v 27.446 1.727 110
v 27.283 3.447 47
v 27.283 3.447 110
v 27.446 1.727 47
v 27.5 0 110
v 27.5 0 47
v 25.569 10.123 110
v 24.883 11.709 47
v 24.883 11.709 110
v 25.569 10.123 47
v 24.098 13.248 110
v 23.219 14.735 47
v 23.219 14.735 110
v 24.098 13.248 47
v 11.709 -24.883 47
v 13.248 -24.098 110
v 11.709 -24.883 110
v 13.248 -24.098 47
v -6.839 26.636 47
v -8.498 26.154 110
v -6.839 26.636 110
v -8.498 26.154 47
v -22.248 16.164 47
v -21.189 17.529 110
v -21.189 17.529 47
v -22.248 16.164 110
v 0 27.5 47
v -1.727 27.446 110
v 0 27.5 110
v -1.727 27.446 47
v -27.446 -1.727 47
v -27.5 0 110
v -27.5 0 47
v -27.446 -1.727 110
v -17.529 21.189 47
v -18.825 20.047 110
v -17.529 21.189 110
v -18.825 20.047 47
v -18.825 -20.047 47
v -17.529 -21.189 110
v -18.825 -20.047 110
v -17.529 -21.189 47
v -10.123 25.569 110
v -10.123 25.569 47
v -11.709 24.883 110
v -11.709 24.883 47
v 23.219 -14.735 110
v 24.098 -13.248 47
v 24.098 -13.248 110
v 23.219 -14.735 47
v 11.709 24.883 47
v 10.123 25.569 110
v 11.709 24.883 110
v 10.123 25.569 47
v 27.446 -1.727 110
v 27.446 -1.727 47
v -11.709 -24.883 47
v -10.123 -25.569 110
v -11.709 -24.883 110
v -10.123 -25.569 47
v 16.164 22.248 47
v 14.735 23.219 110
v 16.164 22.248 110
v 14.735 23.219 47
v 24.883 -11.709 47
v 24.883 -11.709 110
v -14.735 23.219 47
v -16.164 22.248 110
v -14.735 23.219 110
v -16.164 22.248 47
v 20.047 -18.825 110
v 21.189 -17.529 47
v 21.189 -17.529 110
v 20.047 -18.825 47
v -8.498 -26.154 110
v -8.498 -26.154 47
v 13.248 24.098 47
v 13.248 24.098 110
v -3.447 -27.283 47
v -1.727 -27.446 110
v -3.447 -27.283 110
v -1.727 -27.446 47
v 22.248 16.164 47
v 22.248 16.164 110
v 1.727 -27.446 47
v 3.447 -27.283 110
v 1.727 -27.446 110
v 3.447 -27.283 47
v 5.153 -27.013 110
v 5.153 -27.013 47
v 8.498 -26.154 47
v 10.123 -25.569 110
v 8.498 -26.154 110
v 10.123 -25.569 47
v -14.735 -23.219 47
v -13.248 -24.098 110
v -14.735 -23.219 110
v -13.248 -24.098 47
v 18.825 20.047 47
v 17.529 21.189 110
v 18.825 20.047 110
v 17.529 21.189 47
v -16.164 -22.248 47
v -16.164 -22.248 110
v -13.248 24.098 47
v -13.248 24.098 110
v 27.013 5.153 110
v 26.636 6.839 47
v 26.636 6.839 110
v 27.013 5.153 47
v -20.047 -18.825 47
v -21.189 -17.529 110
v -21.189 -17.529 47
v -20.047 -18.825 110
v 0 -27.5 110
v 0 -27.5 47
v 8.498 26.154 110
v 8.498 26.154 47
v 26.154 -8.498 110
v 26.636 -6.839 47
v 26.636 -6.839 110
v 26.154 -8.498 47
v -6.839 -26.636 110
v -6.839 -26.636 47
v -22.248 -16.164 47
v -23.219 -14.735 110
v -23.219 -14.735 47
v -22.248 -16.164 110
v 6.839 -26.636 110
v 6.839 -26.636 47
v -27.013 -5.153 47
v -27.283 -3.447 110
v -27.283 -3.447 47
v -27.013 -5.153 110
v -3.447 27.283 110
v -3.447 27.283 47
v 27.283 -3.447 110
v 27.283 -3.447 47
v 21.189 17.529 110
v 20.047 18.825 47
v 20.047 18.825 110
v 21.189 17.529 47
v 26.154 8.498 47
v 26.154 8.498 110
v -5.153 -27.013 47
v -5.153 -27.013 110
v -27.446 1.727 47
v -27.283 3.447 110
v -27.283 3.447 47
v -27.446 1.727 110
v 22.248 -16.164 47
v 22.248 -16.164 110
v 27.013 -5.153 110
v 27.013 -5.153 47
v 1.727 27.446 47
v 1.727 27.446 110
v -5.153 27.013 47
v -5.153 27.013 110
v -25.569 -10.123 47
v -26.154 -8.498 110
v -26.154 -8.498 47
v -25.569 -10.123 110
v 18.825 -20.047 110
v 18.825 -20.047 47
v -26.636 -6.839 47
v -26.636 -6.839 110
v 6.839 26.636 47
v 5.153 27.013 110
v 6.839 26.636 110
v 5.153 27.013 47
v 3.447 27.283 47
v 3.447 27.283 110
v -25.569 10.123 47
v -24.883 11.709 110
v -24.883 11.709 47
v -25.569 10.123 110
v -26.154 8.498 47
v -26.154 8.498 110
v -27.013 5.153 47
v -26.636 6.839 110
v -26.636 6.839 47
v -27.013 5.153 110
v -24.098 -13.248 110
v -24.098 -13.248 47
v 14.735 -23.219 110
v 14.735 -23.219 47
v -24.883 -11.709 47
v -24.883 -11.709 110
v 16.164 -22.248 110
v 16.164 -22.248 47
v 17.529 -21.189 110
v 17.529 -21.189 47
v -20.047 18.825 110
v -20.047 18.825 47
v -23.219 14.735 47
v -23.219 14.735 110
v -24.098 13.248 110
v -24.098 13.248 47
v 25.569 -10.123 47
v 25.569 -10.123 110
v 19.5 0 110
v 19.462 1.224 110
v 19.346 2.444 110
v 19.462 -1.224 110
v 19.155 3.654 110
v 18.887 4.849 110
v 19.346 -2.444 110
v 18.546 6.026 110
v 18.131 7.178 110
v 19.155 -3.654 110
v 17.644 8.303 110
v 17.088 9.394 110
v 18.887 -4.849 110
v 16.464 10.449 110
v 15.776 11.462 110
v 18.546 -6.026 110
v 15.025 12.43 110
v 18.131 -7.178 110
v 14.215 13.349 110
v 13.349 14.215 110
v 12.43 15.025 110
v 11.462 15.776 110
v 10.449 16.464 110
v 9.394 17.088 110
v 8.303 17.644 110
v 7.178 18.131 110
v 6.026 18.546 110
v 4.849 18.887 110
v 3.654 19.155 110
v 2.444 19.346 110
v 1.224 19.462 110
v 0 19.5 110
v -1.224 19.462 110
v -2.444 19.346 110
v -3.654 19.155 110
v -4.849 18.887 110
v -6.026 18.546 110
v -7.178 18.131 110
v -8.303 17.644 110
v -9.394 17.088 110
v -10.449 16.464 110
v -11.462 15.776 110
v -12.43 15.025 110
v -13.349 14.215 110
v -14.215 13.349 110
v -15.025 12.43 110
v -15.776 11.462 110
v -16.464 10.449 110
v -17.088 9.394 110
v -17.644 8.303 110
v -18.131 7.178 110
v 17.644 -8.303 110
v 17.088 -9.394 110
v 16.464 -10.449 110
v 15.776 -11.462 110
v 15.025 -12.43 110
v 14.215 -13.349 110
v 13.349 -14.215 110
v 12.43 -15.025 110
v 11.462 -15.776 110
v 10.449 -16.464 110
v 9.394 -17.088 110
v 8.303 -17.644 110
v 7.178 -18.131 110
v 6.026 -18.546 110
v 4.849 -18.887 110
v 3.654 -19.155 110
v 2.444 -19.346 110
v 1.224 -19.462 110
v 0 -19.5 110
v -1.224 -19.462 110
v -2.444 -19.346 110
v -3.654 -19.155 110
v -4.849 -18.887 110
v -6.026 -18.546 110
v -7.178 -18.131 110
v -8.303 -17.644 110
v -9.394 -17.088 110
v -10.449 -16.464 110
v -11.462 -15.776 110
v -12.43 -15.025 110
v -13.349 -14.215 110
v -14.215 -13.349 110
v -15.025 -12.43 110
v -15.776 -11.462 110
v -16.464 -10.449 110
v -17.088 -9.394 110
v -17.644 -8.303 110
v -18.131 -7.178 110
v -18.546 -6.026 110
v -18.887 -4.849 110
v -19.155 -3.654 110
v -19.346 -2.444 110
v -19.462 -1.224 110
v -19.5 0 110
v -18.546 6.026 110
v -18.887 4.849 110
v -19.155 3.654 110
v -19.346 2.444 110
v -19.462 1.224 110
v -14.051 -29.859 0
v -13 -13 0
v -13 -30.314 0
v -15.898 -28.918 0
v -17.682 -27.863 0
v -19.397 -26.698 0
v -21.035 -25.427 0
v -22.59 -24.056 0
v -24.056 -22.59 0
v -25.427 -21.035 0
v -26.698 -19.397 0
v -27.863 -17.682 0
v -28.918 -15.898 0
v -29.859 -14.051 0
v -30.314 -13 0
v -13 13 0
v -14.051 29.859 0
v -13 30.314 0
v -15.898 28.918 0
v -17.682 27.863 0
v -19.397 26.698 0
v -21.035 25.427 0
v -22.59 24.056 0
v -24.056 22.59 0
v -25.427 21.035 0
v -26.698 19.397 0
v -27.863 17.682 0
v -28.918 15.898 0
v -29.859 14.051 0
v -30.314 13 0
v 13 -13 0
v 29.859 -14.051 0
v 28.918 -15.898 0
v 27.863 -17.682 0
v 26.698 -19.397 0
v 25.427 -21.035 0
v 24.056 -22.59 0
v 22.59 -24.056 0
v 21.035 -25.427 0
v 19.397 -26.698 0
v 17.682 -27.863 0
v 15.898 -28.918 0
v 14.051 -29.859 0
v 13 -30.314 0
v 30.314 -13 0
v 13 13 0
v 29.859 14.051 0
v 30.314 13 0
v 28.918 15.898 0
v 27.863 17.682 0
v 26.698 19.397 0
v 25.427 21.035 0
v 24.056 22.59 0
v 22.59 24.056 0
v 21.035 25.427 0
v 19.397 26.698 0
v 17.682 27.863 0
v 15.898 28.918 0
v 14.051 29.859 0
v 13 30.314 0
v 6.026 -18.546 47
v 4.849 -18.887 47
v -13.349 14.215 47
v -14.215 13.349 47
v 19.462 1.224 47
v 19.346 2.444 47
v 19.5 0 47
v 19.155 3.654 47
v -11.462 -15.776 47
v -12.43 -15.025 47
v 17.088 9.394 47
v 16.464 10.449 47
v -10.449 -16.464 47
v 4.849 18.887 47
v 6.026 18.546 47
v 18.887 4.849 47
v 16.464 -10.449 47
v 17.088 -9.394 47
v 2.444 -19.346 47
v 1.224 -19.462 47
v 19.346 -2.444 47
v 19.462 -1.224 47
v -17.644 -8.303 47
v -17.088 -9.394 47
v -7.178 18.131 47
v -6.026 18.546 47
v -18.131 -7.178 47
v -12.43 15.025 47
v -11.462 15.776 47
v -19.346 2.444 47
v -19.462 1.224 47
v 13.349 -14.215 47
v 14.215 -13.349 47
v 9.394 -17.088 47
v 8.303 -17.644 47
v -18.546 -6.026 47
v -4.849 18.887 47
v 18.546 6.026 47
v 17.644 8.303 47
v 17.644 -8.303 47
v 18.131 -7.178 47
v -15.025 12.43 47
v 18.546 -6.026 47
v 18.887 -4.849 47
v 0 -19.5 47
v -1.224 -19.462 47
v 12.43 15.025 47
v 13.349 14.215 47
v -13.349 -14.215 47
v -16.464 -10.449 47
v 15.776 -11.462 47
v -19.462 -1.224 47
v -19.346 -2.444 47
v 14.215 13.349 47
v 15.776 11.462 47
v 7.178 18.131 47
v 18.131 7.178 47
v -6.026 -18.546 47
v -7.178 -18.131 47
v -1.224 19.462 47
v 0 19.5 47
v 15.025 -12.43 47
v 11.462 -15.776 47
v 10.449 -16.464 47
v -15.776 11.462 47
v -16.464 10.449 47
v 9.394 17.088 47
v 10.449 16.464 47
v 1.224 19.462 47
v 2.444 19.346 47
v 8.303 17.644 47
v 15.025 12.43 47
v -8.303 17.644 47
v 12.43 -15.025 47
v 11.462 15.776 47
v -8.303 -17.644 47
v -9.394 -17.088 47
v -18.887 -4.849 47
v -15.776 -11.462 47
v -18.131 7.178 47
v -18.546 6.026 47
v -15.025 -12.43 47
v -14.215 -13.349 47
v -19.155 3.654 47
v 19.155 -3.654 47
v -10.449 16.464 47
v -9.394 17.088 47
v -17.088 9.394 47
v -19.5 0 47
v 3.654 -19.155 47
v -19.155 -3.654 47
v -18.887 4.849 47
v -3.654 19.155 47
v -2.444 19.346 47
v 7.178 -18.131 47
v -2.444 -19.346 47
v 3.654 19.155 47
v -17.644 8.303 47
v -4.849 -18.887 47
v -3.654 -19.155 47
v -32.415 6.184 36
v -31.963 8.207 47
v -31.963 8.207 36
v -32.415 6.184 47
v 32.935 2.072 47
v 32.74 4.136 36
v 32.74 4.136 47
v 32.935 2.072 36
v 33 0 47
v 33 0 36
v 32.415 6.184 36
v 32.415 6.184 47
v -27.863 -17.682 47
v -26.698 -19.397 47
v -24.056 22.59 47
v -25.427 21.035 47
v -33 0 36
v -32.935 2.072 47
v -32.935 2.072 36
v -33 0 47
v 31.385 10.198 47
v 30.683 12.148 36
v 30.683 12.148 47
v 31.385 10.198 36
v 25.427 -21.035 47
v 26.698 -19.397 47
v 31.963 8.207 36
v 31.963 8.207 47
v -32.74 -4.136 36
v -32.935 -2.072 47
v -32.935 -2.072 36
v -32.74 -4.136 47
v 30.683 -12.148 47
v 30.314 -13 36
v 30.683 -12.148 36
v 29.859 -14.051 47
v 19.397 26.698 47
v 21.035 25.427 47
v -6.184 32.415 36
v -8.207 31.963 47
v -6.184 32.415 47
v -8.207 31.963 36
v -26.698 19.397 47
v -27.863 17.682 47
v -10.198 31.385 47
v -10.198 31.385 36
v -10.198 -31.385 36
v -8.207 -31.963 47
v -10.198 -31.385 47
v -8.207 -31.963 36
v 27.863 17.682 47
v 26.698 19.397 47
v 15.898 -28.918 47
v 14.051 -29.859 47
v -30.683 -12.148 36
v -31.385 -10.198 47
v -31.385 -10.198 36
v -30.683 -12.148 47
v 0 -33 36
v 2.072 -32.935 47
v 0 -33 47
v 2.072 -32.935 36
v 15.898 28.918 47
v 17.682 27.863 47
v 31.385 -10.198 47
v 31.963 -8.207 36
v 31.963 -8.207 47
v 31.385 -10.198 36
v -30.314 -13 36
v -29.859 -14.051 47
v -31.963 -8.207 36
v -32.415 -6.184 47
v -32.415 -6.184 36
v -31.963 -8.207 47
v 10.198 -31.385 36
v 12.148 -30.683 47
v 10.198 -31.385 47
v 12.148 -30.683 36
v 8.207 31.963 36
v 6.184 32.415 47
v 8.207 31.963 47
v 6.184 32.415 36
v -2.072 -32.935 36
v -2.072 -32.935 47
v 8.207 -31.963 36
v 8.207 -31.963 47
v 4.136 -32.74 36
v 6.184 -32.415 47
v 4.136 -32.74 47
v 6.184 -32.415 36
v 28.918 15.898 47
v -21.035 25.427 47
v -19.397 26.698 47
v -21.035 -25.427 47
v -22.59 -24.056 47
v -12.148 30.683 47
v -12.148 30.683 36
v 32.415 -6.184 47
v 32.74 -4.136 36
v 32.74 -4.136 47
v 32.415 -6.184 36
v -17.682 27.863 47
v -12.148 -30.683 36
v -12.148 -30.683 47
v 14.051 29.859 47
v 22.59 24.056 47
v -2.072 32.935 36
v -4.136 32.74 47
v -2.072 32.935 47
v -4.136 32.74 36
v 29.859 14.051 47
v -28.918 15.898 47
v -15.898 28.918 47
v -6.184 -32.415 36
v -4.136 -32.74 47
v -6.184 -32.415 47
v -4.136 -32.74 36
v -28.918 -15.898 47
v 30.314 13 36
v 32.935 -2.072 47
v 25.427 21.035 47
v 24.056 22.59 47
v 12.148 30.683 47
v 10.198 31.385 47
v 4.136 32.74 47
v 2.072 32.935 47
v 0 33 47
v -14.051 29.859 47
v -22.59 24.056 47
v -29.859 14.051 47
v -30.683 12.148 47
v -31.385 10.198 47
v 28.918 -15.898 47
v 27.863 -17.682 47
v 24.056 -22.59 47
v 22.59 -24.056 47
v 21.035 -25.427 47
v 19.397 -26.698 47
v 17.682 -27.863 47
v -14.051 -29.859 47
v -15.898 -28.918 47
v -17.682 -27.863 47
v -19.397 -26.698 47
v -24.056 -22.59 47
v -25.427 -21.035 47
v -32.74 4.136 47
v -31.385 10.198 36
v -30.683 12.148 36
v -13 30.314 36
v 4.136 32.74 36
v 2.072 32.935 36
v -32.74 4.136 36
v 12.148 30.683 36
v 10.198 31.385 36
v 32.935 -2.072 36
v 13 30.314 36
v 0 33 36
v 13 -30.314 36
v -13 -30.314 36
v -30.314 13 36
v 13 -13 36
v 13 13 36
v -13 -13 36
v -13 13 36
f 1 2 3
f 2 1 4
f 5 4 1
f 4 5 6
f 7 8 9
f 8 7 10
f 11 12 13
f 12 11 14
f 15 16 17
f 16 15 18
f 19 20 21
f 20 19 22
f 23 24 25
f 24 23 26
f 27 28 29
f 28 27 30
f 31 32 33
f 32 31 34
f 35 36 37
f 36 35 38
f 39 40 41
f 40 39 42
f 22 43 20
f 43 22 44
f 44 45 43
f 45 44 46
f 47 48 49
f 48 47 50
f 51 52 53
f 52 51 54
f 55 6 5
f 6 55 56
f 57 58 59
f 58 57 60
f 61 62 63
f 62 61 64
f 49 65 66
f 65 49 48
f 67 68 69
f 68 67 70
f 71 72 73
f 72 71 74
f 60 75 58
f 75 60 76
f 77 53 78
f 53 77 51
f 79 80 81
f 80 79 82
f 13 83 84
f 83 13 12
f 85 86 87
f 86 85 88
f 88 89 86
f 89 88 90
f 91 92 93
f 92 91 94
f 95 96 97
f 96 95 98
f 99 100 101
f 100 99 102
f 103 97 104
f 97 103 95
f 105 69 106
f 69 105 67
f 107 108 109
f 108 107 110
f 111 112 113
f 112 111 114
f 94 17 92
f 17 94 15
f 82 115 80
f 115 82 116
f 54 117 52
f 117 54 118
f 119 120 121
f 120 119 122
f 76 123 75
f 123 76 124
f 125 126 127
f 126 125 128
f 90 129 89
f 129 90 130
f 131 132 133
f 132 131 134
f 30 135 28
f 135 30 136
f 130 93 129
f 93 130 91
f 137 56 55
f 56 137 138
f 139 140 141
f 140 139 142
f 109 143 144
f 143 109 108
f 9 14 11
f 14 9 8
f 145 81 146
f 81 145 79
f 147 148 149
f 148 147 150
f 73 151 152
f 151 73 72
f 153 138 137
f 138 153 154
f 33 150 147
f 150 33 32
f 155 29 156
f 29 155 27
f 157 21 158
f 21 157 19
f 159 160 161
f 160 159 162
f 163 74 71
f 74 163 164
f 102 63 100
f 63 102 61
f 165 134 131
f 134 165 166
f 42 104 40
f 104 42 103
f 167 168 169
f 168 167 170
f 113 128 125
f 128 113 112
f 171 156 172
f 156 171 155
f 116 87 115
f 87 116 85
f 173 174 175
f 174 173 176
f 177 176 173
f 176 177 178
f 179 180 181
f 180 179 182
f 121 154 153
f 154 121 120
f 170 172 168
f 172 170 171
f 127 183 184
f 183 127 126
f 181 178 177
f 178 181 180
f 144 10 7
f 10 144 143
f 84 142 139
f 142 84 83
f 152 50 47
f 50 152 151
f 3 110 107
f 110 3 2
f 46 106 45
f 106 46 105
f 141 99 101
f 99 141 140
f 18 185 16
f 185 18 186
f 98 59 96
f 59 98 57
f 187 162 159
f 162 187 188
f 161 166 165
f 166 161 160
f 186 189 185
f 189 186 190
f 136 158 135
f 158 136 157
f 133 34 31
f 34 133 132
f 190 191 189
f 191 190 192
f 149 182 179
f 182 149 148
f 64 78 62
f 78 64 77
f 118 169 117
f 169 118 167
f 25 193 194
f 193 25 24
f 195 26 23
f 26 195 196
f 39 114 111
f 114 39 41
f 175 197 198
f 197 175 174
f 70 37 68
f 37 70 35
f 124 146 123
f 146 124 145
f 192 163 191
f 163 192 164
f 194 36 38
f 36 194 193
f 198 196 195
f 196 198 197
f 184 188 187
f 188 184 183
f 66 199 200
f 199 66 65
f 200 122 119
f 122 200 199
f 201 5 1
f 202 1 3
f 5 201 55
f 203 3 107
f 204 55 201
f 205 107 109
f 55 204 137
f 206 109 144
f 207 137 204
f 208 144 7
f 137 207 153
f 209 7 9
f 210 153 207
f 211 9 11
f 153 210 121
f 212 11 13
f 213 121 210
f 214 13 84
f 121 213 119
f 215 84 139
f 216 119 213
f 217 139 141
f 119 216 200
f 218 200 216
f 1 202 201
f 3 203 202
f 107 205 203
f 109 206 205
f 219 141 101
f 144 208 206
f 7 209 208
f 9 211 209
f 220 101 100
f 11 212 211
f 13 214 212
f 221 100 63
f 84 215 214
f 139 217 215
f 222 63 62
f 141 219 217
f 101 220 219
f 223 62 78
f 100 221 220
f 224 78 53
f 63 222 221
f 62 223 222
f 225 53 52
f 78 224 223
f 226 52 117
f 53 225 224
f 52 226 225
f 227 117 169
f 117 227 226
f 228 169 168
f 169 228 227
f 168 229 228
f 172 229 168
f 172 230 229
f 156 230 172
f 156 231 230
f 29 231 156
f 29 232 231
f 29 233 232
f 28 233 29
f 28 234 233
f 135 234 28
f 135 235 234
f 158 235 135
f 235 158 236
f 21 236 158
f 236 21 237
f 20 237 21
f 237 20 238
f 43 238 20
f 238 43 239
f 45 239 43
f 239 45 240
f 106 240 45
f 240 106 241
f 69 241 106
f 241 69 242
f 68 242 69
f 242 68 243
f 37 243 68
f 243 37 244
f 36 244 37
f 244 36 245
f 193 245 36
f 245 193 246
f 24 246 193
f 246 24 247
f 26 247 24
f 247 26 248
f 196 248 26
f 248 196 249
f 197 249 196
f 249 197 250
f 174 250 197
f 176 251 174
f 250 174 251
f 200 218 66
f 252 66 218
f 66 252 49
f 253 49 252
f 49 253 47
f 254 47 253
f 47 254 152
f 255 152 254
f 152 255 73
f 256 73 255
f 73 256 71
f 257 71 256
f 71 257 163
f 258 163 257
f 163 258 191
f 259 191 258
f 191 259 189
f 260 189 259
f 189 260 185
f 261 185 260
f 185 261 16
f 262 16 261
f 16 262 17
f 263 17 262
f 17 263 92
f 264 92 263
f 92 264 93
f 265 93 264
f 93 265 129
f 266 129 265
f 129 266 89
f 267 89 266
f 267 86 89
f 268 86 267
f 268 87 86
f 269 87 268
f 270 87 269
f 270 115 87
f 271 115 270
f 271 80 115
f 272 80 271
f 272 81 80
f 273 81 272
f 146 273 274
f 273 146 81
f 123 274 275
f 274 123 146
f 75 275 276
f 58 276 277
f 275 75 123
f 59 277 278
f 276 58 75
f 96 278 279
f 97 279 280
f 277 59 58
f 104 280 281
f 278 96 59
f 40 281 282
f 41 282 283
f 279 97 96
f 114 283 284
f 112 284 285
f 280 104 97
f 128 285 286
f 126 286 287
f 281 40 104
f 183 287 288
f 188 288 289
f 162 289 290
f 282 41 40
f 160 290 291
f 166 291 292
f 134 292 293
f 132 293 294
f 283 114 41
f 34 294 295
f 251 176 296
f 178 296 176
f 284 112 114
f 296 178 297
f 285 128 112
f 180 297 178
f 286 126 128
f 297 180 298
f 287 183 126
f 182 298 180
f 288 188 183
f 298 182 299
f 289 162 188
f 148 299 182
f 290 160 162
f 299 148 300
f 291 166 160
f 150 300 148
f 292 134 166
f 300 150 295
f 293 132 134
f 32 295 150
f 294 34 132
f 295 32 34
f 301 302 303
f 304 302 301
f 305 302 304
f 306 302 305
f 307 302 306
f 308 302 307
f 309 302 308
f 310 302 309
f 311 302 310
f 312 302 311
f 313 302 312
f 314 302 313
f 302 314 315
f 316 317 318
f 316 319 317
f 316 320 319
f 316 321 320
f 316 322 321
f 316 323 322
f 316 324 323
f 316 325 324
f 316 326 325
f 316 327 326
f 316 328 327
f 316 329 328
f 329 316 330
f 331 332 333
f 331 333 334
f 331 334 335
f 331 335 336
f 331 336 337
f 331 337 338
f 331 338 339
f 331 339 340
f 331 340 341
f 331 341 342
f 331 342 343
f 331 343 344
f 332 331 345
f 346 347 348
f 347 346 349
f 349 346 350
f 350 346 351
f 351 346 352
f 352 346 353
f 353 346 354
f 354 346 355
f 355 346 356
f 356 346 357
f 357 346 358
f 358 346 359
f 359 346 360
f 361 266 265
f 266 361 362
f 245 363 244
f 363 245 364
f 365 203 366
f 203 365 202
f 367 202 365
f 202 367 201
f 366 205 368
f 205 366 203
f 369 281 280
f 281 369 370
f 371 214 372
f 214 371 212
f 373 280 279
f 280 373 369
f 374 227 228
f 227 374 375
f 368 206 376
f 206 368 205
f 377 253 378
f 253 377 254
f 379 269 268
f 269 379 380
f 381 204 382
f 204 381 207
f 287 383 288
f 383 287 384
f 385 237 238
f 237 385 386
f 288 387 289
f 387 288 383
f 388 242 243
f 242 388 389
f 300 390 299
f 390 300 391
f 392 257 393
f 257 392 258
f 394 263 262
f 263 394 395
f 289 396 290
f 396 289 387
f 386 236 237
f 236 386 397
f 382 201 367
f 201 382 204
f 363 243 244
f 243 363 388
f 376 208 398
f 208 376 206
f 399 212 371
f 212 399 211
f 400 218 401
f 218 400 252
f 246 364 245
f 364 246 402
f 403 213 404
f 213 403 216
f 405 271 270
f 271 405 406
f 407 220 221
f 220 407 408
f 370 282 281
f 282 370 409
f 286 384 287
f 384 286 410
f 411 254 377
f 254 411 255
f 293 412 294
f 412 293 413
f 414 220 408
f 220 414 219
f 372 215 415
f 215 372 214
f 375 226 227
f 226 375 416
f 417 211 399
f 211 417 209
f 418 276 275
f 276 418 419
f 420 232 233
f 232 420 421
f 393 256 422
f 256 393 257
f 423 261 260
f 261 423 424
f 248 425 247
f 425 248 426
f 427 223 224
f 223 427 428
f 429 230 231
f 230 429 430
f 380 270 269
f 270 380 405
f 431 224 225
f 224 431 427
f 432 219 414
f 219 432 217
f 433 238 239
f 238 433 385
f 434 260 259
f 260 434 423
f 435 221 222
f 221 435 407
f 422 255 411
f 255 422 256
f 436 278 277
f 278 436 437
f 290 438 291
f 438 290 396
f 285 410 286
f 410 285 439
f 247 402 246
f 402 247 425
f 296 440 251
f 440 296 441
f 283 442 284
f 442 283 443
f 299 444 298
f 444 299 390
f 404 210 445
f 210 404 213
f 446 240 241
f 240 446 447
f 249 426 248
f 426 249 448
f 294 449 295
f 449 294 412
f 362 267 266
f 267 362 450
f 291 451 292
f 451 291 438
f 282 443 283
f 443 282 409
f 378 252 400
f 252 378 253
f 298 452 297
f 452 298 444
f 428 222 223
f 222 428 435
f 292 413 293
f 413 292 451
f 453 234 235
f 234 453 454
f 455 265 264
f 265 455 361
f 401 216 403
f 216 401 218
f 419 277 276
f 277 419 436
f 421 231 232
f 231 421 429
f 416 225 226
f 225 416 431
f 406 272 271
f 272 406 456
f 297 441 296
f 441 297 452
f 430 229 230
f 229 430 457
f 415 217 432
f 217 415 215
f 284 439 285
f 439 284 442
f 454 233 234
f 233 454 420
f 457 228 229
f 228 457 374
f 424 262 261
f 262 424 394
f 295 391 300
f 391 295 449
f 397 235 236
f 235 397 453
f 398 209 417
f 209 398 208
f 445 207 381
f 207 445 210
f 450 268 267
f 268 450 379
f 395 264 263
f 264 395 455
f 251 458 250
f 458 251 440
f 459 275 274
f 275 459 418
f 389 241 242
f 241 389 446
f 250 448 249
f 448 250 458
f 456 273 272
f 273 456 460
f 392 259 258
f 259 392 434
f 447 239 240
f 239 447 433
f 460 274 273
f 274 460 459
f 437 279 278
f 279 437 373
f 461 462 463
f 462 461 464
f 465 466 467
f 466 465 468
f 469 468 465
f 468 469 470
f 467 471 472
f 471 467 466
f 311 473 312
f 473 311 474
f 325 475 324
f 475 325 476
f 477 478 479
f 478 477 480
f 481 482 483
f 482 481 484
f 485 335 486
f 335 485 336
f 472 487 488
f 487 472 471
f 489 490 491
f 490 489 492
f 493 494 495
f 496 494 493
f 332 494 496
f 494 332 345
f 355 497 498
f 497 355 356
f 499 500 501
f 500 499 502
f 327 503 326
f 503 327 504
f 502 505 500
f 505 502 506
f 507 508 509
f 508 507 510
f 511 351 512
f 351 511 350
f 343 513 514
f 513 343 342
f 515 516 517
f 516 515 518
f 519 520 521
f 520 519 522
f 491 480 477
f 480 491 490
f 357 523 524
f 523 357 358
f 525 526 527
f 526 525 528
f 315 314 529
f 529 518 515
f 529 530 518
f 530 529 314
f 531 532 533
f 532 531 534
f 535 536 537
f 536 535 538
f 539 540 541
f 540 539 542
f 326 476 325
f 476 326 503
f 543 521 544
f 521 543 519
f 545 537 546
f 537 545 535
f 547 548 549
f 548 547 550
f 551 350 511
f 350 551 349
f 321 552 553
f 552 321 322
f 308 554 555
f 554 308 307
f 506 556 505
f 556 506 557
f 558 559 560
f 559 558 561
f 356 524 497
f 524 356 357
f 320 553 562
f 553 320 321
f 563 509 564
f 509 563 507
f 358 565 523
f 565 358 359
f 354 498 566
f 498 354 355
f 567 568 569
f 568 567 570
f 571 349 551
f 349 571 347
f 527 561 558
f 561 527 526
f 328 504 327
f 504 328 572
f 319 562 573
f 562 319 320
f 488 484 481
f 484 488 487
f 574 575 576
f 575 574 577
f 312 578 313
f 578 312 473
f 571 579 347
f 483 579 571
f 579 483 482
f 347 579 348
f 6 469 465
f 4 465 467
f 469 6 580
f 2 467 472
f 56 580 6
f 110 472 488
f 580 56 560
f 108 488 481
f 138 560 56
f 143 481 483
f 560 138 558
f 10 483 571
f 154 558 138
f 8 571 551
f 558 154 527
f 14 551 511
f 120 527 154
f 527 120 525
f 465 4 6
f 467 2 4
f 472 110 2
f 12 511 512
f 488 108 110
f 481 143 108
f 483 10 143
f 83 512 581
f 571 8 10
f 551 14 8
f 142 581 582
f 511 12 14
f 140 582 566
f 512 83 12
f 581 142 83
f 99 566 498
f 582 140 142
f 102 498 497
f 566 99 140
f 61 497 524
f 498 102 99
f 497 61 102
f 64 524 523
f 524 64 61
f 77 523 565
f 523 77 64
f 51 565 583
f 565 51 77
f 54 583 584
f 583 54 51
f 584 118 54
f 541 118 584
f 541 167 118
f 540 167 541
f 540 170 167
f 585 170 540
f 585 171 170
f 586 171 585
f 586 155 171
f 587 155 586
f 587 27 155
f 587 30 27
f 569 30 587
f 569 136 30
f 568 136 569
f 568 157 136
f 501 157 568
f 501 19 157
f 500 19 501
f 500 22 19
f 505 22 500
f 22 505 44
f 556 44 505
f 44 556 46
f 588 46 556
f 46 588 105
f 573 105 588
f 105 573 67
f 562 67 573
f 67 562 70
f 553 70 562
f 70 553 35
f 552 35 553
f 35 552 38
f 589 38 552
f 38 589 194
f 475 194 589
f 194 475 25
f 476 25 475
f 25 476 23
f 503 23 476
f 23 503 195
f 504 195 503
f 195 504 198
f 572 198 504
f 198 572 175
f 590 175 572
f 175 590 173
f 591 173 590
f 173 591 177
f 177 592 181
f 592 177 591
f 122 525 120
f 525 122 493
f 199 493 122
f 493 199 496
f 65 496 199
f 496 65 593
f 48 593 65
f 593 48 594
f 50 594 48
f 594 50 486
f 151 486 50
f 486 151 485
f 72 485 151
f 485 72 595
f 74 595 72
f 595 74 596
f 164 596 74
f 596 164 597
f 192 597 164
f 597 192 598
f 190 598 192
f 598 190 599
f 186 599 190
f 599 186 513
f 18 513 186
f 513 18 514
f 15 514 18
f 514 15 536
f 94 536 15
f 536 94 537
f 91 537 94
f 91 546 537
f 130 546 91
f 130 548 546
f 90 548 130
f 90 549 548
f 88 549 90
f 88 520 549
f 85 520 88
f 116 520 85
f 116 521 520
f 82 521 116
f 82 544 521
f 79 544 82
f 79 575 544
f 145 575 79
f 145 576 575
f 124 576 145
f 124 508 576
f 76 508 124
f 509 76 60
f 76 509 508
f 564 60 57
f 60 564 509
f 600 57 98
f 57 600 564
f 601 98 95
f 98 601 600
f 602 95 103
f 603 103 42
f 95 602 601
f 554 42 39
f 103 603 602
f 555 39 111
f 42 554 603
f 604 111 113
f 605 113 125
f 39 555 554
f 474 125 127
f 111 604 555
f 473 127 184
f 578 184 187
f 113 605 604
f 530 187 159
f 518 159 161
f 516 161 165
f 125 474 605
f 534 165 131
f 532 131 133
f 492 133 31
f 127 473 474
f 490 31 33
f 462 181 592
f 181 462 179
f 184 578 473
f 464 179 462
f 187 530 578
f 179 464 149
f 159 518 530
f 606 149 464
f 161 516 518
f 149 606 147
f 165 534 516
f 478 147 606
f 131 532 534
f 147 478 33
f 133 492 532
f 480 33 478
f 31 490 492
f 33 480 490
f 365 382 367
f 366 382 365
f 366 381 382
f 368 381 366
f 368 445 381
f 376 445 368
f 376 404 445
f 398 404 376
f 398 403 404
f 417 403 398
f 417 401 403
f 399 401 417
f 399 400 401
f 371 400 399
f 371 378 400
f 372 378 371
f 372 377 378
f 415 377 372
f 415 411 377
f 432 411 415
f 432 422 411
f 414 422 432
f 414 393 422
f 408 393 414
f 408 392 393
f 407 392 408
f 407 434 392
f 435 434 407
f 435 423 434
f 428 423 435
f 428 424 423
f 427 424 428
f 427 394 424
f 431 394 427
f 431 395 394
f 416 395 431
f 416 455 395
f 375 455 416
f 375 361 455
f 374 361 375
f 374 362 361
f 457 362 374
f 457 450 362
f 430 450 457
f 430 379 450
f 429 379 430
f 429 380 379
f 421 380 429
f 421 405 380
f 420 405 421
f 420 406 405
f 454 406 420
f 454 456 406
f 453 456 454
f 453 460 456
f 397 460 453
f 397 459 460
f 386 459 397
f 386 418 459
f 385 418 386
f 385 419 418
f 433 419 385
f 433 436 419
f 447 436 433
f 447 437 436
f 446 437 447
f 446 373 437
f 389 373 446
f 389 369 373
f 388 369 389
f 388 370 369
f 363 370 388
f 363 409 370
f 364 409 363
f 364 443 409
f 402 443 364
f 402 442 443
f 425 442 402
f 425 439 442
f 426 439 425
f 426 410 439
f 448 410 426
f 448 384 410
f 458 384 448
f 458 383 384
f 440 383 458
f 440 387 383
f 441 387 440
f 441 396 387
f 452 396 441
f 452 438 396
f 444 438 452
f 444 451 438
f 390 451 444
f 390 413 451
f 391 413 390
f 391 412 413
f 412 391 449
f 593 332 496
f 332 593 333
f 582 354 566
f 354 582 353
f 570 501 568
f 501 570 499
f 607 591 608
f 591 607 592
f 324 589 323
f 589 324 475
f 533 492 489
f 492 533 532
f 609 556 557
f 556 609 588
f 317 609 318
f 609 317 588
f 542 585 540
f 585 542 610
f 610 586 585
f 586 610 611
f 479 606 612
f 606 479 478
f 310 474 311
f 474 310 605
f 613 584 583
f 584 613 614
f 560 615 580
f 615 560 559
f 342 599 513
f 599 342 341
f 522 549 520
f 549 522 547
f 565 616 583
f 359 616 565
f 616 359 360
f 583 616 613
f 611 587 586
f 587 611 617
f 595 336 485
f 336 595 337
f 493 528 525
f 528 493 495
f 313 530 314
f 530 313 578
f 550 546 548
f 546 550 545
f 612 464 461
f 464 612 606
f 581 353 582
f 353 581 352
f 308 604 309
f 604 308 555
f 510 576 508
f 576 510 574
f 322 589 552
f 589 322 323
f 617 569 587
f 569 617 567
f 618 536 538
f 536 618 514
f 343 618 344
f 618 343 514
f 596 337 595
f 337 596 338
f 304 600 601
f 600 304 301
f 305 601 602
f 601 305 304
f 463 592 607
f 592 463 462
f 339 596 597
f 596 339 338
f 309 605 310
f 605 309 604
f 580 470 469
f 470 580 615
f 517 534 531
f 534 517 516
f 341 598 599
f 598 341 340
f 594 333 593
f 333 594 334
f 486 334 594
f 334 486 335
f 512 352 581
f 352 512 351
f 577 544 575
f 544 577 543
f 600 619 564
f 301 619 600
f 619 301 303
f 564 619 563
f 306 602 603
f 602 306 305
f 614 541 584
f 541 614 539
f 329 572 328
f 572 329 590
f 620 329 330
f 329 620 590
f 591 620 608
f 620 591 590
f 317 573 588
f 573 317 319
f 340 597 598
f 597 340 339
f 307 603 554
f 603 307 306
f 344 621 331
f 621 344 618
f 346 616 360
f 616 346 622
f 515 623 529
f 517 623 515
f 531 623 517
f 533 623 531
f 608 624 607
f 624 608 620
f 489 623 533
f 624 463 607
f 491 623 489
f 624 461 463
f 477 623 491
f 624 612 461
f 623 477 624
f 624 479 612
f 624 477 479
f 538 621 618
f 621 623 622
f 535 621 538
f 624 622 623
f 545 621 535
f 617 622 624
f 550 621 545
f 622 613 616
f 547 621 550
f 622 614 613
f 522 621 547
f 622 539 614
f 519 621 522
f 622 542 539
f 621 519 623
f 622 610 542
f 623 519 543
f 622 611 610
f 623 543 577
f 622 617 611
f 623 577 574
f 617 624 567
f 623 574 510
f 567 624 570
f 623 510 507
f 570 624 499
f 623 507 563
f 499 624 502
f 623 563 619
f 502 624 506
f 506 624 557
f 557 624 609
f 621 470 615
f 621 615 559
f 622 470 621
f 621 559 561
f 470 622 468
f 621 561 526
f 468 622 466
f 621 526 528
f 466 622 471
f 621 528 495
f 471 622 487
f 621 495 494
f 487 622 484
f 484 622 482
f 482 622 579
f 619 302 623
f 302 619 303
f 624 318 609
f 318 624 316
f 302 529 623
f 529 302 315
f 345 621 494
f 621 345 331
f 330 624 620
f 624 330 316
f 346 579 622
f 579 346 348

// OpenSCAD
$fn = $preview ? 0 : 100; 
poleDiameter = 39;
poleRadius = poleDiameter/2;
outerDiameter = 55;
outerRadius=outerDiameter/2;
supportRadius=outerRadius*1.2;
supportHeight=37;
supportWidth=26;
baseHeight=10;
difference() {
  union() {
    difference() {
      color("red") cylinder(h=110,r=outerRadius,center=false);
      translate([0,0,-1]) { cylinder(h=120,r=poleRadius,center=false); } 
    };
    color("green") cylinder(h=supportHeight+baseHeight, r=supportRadius);
  }
  union() {
    translate([-(supportWidth/2), -60, -1]) {cube([supportWidth,120,supportHeight]);};
    rotate([0,0,90]) {
        translate([-(supportWidth/2), -60, -1]) {cube([supportWidth,120,supportHeight]);};
    }
  }
}
